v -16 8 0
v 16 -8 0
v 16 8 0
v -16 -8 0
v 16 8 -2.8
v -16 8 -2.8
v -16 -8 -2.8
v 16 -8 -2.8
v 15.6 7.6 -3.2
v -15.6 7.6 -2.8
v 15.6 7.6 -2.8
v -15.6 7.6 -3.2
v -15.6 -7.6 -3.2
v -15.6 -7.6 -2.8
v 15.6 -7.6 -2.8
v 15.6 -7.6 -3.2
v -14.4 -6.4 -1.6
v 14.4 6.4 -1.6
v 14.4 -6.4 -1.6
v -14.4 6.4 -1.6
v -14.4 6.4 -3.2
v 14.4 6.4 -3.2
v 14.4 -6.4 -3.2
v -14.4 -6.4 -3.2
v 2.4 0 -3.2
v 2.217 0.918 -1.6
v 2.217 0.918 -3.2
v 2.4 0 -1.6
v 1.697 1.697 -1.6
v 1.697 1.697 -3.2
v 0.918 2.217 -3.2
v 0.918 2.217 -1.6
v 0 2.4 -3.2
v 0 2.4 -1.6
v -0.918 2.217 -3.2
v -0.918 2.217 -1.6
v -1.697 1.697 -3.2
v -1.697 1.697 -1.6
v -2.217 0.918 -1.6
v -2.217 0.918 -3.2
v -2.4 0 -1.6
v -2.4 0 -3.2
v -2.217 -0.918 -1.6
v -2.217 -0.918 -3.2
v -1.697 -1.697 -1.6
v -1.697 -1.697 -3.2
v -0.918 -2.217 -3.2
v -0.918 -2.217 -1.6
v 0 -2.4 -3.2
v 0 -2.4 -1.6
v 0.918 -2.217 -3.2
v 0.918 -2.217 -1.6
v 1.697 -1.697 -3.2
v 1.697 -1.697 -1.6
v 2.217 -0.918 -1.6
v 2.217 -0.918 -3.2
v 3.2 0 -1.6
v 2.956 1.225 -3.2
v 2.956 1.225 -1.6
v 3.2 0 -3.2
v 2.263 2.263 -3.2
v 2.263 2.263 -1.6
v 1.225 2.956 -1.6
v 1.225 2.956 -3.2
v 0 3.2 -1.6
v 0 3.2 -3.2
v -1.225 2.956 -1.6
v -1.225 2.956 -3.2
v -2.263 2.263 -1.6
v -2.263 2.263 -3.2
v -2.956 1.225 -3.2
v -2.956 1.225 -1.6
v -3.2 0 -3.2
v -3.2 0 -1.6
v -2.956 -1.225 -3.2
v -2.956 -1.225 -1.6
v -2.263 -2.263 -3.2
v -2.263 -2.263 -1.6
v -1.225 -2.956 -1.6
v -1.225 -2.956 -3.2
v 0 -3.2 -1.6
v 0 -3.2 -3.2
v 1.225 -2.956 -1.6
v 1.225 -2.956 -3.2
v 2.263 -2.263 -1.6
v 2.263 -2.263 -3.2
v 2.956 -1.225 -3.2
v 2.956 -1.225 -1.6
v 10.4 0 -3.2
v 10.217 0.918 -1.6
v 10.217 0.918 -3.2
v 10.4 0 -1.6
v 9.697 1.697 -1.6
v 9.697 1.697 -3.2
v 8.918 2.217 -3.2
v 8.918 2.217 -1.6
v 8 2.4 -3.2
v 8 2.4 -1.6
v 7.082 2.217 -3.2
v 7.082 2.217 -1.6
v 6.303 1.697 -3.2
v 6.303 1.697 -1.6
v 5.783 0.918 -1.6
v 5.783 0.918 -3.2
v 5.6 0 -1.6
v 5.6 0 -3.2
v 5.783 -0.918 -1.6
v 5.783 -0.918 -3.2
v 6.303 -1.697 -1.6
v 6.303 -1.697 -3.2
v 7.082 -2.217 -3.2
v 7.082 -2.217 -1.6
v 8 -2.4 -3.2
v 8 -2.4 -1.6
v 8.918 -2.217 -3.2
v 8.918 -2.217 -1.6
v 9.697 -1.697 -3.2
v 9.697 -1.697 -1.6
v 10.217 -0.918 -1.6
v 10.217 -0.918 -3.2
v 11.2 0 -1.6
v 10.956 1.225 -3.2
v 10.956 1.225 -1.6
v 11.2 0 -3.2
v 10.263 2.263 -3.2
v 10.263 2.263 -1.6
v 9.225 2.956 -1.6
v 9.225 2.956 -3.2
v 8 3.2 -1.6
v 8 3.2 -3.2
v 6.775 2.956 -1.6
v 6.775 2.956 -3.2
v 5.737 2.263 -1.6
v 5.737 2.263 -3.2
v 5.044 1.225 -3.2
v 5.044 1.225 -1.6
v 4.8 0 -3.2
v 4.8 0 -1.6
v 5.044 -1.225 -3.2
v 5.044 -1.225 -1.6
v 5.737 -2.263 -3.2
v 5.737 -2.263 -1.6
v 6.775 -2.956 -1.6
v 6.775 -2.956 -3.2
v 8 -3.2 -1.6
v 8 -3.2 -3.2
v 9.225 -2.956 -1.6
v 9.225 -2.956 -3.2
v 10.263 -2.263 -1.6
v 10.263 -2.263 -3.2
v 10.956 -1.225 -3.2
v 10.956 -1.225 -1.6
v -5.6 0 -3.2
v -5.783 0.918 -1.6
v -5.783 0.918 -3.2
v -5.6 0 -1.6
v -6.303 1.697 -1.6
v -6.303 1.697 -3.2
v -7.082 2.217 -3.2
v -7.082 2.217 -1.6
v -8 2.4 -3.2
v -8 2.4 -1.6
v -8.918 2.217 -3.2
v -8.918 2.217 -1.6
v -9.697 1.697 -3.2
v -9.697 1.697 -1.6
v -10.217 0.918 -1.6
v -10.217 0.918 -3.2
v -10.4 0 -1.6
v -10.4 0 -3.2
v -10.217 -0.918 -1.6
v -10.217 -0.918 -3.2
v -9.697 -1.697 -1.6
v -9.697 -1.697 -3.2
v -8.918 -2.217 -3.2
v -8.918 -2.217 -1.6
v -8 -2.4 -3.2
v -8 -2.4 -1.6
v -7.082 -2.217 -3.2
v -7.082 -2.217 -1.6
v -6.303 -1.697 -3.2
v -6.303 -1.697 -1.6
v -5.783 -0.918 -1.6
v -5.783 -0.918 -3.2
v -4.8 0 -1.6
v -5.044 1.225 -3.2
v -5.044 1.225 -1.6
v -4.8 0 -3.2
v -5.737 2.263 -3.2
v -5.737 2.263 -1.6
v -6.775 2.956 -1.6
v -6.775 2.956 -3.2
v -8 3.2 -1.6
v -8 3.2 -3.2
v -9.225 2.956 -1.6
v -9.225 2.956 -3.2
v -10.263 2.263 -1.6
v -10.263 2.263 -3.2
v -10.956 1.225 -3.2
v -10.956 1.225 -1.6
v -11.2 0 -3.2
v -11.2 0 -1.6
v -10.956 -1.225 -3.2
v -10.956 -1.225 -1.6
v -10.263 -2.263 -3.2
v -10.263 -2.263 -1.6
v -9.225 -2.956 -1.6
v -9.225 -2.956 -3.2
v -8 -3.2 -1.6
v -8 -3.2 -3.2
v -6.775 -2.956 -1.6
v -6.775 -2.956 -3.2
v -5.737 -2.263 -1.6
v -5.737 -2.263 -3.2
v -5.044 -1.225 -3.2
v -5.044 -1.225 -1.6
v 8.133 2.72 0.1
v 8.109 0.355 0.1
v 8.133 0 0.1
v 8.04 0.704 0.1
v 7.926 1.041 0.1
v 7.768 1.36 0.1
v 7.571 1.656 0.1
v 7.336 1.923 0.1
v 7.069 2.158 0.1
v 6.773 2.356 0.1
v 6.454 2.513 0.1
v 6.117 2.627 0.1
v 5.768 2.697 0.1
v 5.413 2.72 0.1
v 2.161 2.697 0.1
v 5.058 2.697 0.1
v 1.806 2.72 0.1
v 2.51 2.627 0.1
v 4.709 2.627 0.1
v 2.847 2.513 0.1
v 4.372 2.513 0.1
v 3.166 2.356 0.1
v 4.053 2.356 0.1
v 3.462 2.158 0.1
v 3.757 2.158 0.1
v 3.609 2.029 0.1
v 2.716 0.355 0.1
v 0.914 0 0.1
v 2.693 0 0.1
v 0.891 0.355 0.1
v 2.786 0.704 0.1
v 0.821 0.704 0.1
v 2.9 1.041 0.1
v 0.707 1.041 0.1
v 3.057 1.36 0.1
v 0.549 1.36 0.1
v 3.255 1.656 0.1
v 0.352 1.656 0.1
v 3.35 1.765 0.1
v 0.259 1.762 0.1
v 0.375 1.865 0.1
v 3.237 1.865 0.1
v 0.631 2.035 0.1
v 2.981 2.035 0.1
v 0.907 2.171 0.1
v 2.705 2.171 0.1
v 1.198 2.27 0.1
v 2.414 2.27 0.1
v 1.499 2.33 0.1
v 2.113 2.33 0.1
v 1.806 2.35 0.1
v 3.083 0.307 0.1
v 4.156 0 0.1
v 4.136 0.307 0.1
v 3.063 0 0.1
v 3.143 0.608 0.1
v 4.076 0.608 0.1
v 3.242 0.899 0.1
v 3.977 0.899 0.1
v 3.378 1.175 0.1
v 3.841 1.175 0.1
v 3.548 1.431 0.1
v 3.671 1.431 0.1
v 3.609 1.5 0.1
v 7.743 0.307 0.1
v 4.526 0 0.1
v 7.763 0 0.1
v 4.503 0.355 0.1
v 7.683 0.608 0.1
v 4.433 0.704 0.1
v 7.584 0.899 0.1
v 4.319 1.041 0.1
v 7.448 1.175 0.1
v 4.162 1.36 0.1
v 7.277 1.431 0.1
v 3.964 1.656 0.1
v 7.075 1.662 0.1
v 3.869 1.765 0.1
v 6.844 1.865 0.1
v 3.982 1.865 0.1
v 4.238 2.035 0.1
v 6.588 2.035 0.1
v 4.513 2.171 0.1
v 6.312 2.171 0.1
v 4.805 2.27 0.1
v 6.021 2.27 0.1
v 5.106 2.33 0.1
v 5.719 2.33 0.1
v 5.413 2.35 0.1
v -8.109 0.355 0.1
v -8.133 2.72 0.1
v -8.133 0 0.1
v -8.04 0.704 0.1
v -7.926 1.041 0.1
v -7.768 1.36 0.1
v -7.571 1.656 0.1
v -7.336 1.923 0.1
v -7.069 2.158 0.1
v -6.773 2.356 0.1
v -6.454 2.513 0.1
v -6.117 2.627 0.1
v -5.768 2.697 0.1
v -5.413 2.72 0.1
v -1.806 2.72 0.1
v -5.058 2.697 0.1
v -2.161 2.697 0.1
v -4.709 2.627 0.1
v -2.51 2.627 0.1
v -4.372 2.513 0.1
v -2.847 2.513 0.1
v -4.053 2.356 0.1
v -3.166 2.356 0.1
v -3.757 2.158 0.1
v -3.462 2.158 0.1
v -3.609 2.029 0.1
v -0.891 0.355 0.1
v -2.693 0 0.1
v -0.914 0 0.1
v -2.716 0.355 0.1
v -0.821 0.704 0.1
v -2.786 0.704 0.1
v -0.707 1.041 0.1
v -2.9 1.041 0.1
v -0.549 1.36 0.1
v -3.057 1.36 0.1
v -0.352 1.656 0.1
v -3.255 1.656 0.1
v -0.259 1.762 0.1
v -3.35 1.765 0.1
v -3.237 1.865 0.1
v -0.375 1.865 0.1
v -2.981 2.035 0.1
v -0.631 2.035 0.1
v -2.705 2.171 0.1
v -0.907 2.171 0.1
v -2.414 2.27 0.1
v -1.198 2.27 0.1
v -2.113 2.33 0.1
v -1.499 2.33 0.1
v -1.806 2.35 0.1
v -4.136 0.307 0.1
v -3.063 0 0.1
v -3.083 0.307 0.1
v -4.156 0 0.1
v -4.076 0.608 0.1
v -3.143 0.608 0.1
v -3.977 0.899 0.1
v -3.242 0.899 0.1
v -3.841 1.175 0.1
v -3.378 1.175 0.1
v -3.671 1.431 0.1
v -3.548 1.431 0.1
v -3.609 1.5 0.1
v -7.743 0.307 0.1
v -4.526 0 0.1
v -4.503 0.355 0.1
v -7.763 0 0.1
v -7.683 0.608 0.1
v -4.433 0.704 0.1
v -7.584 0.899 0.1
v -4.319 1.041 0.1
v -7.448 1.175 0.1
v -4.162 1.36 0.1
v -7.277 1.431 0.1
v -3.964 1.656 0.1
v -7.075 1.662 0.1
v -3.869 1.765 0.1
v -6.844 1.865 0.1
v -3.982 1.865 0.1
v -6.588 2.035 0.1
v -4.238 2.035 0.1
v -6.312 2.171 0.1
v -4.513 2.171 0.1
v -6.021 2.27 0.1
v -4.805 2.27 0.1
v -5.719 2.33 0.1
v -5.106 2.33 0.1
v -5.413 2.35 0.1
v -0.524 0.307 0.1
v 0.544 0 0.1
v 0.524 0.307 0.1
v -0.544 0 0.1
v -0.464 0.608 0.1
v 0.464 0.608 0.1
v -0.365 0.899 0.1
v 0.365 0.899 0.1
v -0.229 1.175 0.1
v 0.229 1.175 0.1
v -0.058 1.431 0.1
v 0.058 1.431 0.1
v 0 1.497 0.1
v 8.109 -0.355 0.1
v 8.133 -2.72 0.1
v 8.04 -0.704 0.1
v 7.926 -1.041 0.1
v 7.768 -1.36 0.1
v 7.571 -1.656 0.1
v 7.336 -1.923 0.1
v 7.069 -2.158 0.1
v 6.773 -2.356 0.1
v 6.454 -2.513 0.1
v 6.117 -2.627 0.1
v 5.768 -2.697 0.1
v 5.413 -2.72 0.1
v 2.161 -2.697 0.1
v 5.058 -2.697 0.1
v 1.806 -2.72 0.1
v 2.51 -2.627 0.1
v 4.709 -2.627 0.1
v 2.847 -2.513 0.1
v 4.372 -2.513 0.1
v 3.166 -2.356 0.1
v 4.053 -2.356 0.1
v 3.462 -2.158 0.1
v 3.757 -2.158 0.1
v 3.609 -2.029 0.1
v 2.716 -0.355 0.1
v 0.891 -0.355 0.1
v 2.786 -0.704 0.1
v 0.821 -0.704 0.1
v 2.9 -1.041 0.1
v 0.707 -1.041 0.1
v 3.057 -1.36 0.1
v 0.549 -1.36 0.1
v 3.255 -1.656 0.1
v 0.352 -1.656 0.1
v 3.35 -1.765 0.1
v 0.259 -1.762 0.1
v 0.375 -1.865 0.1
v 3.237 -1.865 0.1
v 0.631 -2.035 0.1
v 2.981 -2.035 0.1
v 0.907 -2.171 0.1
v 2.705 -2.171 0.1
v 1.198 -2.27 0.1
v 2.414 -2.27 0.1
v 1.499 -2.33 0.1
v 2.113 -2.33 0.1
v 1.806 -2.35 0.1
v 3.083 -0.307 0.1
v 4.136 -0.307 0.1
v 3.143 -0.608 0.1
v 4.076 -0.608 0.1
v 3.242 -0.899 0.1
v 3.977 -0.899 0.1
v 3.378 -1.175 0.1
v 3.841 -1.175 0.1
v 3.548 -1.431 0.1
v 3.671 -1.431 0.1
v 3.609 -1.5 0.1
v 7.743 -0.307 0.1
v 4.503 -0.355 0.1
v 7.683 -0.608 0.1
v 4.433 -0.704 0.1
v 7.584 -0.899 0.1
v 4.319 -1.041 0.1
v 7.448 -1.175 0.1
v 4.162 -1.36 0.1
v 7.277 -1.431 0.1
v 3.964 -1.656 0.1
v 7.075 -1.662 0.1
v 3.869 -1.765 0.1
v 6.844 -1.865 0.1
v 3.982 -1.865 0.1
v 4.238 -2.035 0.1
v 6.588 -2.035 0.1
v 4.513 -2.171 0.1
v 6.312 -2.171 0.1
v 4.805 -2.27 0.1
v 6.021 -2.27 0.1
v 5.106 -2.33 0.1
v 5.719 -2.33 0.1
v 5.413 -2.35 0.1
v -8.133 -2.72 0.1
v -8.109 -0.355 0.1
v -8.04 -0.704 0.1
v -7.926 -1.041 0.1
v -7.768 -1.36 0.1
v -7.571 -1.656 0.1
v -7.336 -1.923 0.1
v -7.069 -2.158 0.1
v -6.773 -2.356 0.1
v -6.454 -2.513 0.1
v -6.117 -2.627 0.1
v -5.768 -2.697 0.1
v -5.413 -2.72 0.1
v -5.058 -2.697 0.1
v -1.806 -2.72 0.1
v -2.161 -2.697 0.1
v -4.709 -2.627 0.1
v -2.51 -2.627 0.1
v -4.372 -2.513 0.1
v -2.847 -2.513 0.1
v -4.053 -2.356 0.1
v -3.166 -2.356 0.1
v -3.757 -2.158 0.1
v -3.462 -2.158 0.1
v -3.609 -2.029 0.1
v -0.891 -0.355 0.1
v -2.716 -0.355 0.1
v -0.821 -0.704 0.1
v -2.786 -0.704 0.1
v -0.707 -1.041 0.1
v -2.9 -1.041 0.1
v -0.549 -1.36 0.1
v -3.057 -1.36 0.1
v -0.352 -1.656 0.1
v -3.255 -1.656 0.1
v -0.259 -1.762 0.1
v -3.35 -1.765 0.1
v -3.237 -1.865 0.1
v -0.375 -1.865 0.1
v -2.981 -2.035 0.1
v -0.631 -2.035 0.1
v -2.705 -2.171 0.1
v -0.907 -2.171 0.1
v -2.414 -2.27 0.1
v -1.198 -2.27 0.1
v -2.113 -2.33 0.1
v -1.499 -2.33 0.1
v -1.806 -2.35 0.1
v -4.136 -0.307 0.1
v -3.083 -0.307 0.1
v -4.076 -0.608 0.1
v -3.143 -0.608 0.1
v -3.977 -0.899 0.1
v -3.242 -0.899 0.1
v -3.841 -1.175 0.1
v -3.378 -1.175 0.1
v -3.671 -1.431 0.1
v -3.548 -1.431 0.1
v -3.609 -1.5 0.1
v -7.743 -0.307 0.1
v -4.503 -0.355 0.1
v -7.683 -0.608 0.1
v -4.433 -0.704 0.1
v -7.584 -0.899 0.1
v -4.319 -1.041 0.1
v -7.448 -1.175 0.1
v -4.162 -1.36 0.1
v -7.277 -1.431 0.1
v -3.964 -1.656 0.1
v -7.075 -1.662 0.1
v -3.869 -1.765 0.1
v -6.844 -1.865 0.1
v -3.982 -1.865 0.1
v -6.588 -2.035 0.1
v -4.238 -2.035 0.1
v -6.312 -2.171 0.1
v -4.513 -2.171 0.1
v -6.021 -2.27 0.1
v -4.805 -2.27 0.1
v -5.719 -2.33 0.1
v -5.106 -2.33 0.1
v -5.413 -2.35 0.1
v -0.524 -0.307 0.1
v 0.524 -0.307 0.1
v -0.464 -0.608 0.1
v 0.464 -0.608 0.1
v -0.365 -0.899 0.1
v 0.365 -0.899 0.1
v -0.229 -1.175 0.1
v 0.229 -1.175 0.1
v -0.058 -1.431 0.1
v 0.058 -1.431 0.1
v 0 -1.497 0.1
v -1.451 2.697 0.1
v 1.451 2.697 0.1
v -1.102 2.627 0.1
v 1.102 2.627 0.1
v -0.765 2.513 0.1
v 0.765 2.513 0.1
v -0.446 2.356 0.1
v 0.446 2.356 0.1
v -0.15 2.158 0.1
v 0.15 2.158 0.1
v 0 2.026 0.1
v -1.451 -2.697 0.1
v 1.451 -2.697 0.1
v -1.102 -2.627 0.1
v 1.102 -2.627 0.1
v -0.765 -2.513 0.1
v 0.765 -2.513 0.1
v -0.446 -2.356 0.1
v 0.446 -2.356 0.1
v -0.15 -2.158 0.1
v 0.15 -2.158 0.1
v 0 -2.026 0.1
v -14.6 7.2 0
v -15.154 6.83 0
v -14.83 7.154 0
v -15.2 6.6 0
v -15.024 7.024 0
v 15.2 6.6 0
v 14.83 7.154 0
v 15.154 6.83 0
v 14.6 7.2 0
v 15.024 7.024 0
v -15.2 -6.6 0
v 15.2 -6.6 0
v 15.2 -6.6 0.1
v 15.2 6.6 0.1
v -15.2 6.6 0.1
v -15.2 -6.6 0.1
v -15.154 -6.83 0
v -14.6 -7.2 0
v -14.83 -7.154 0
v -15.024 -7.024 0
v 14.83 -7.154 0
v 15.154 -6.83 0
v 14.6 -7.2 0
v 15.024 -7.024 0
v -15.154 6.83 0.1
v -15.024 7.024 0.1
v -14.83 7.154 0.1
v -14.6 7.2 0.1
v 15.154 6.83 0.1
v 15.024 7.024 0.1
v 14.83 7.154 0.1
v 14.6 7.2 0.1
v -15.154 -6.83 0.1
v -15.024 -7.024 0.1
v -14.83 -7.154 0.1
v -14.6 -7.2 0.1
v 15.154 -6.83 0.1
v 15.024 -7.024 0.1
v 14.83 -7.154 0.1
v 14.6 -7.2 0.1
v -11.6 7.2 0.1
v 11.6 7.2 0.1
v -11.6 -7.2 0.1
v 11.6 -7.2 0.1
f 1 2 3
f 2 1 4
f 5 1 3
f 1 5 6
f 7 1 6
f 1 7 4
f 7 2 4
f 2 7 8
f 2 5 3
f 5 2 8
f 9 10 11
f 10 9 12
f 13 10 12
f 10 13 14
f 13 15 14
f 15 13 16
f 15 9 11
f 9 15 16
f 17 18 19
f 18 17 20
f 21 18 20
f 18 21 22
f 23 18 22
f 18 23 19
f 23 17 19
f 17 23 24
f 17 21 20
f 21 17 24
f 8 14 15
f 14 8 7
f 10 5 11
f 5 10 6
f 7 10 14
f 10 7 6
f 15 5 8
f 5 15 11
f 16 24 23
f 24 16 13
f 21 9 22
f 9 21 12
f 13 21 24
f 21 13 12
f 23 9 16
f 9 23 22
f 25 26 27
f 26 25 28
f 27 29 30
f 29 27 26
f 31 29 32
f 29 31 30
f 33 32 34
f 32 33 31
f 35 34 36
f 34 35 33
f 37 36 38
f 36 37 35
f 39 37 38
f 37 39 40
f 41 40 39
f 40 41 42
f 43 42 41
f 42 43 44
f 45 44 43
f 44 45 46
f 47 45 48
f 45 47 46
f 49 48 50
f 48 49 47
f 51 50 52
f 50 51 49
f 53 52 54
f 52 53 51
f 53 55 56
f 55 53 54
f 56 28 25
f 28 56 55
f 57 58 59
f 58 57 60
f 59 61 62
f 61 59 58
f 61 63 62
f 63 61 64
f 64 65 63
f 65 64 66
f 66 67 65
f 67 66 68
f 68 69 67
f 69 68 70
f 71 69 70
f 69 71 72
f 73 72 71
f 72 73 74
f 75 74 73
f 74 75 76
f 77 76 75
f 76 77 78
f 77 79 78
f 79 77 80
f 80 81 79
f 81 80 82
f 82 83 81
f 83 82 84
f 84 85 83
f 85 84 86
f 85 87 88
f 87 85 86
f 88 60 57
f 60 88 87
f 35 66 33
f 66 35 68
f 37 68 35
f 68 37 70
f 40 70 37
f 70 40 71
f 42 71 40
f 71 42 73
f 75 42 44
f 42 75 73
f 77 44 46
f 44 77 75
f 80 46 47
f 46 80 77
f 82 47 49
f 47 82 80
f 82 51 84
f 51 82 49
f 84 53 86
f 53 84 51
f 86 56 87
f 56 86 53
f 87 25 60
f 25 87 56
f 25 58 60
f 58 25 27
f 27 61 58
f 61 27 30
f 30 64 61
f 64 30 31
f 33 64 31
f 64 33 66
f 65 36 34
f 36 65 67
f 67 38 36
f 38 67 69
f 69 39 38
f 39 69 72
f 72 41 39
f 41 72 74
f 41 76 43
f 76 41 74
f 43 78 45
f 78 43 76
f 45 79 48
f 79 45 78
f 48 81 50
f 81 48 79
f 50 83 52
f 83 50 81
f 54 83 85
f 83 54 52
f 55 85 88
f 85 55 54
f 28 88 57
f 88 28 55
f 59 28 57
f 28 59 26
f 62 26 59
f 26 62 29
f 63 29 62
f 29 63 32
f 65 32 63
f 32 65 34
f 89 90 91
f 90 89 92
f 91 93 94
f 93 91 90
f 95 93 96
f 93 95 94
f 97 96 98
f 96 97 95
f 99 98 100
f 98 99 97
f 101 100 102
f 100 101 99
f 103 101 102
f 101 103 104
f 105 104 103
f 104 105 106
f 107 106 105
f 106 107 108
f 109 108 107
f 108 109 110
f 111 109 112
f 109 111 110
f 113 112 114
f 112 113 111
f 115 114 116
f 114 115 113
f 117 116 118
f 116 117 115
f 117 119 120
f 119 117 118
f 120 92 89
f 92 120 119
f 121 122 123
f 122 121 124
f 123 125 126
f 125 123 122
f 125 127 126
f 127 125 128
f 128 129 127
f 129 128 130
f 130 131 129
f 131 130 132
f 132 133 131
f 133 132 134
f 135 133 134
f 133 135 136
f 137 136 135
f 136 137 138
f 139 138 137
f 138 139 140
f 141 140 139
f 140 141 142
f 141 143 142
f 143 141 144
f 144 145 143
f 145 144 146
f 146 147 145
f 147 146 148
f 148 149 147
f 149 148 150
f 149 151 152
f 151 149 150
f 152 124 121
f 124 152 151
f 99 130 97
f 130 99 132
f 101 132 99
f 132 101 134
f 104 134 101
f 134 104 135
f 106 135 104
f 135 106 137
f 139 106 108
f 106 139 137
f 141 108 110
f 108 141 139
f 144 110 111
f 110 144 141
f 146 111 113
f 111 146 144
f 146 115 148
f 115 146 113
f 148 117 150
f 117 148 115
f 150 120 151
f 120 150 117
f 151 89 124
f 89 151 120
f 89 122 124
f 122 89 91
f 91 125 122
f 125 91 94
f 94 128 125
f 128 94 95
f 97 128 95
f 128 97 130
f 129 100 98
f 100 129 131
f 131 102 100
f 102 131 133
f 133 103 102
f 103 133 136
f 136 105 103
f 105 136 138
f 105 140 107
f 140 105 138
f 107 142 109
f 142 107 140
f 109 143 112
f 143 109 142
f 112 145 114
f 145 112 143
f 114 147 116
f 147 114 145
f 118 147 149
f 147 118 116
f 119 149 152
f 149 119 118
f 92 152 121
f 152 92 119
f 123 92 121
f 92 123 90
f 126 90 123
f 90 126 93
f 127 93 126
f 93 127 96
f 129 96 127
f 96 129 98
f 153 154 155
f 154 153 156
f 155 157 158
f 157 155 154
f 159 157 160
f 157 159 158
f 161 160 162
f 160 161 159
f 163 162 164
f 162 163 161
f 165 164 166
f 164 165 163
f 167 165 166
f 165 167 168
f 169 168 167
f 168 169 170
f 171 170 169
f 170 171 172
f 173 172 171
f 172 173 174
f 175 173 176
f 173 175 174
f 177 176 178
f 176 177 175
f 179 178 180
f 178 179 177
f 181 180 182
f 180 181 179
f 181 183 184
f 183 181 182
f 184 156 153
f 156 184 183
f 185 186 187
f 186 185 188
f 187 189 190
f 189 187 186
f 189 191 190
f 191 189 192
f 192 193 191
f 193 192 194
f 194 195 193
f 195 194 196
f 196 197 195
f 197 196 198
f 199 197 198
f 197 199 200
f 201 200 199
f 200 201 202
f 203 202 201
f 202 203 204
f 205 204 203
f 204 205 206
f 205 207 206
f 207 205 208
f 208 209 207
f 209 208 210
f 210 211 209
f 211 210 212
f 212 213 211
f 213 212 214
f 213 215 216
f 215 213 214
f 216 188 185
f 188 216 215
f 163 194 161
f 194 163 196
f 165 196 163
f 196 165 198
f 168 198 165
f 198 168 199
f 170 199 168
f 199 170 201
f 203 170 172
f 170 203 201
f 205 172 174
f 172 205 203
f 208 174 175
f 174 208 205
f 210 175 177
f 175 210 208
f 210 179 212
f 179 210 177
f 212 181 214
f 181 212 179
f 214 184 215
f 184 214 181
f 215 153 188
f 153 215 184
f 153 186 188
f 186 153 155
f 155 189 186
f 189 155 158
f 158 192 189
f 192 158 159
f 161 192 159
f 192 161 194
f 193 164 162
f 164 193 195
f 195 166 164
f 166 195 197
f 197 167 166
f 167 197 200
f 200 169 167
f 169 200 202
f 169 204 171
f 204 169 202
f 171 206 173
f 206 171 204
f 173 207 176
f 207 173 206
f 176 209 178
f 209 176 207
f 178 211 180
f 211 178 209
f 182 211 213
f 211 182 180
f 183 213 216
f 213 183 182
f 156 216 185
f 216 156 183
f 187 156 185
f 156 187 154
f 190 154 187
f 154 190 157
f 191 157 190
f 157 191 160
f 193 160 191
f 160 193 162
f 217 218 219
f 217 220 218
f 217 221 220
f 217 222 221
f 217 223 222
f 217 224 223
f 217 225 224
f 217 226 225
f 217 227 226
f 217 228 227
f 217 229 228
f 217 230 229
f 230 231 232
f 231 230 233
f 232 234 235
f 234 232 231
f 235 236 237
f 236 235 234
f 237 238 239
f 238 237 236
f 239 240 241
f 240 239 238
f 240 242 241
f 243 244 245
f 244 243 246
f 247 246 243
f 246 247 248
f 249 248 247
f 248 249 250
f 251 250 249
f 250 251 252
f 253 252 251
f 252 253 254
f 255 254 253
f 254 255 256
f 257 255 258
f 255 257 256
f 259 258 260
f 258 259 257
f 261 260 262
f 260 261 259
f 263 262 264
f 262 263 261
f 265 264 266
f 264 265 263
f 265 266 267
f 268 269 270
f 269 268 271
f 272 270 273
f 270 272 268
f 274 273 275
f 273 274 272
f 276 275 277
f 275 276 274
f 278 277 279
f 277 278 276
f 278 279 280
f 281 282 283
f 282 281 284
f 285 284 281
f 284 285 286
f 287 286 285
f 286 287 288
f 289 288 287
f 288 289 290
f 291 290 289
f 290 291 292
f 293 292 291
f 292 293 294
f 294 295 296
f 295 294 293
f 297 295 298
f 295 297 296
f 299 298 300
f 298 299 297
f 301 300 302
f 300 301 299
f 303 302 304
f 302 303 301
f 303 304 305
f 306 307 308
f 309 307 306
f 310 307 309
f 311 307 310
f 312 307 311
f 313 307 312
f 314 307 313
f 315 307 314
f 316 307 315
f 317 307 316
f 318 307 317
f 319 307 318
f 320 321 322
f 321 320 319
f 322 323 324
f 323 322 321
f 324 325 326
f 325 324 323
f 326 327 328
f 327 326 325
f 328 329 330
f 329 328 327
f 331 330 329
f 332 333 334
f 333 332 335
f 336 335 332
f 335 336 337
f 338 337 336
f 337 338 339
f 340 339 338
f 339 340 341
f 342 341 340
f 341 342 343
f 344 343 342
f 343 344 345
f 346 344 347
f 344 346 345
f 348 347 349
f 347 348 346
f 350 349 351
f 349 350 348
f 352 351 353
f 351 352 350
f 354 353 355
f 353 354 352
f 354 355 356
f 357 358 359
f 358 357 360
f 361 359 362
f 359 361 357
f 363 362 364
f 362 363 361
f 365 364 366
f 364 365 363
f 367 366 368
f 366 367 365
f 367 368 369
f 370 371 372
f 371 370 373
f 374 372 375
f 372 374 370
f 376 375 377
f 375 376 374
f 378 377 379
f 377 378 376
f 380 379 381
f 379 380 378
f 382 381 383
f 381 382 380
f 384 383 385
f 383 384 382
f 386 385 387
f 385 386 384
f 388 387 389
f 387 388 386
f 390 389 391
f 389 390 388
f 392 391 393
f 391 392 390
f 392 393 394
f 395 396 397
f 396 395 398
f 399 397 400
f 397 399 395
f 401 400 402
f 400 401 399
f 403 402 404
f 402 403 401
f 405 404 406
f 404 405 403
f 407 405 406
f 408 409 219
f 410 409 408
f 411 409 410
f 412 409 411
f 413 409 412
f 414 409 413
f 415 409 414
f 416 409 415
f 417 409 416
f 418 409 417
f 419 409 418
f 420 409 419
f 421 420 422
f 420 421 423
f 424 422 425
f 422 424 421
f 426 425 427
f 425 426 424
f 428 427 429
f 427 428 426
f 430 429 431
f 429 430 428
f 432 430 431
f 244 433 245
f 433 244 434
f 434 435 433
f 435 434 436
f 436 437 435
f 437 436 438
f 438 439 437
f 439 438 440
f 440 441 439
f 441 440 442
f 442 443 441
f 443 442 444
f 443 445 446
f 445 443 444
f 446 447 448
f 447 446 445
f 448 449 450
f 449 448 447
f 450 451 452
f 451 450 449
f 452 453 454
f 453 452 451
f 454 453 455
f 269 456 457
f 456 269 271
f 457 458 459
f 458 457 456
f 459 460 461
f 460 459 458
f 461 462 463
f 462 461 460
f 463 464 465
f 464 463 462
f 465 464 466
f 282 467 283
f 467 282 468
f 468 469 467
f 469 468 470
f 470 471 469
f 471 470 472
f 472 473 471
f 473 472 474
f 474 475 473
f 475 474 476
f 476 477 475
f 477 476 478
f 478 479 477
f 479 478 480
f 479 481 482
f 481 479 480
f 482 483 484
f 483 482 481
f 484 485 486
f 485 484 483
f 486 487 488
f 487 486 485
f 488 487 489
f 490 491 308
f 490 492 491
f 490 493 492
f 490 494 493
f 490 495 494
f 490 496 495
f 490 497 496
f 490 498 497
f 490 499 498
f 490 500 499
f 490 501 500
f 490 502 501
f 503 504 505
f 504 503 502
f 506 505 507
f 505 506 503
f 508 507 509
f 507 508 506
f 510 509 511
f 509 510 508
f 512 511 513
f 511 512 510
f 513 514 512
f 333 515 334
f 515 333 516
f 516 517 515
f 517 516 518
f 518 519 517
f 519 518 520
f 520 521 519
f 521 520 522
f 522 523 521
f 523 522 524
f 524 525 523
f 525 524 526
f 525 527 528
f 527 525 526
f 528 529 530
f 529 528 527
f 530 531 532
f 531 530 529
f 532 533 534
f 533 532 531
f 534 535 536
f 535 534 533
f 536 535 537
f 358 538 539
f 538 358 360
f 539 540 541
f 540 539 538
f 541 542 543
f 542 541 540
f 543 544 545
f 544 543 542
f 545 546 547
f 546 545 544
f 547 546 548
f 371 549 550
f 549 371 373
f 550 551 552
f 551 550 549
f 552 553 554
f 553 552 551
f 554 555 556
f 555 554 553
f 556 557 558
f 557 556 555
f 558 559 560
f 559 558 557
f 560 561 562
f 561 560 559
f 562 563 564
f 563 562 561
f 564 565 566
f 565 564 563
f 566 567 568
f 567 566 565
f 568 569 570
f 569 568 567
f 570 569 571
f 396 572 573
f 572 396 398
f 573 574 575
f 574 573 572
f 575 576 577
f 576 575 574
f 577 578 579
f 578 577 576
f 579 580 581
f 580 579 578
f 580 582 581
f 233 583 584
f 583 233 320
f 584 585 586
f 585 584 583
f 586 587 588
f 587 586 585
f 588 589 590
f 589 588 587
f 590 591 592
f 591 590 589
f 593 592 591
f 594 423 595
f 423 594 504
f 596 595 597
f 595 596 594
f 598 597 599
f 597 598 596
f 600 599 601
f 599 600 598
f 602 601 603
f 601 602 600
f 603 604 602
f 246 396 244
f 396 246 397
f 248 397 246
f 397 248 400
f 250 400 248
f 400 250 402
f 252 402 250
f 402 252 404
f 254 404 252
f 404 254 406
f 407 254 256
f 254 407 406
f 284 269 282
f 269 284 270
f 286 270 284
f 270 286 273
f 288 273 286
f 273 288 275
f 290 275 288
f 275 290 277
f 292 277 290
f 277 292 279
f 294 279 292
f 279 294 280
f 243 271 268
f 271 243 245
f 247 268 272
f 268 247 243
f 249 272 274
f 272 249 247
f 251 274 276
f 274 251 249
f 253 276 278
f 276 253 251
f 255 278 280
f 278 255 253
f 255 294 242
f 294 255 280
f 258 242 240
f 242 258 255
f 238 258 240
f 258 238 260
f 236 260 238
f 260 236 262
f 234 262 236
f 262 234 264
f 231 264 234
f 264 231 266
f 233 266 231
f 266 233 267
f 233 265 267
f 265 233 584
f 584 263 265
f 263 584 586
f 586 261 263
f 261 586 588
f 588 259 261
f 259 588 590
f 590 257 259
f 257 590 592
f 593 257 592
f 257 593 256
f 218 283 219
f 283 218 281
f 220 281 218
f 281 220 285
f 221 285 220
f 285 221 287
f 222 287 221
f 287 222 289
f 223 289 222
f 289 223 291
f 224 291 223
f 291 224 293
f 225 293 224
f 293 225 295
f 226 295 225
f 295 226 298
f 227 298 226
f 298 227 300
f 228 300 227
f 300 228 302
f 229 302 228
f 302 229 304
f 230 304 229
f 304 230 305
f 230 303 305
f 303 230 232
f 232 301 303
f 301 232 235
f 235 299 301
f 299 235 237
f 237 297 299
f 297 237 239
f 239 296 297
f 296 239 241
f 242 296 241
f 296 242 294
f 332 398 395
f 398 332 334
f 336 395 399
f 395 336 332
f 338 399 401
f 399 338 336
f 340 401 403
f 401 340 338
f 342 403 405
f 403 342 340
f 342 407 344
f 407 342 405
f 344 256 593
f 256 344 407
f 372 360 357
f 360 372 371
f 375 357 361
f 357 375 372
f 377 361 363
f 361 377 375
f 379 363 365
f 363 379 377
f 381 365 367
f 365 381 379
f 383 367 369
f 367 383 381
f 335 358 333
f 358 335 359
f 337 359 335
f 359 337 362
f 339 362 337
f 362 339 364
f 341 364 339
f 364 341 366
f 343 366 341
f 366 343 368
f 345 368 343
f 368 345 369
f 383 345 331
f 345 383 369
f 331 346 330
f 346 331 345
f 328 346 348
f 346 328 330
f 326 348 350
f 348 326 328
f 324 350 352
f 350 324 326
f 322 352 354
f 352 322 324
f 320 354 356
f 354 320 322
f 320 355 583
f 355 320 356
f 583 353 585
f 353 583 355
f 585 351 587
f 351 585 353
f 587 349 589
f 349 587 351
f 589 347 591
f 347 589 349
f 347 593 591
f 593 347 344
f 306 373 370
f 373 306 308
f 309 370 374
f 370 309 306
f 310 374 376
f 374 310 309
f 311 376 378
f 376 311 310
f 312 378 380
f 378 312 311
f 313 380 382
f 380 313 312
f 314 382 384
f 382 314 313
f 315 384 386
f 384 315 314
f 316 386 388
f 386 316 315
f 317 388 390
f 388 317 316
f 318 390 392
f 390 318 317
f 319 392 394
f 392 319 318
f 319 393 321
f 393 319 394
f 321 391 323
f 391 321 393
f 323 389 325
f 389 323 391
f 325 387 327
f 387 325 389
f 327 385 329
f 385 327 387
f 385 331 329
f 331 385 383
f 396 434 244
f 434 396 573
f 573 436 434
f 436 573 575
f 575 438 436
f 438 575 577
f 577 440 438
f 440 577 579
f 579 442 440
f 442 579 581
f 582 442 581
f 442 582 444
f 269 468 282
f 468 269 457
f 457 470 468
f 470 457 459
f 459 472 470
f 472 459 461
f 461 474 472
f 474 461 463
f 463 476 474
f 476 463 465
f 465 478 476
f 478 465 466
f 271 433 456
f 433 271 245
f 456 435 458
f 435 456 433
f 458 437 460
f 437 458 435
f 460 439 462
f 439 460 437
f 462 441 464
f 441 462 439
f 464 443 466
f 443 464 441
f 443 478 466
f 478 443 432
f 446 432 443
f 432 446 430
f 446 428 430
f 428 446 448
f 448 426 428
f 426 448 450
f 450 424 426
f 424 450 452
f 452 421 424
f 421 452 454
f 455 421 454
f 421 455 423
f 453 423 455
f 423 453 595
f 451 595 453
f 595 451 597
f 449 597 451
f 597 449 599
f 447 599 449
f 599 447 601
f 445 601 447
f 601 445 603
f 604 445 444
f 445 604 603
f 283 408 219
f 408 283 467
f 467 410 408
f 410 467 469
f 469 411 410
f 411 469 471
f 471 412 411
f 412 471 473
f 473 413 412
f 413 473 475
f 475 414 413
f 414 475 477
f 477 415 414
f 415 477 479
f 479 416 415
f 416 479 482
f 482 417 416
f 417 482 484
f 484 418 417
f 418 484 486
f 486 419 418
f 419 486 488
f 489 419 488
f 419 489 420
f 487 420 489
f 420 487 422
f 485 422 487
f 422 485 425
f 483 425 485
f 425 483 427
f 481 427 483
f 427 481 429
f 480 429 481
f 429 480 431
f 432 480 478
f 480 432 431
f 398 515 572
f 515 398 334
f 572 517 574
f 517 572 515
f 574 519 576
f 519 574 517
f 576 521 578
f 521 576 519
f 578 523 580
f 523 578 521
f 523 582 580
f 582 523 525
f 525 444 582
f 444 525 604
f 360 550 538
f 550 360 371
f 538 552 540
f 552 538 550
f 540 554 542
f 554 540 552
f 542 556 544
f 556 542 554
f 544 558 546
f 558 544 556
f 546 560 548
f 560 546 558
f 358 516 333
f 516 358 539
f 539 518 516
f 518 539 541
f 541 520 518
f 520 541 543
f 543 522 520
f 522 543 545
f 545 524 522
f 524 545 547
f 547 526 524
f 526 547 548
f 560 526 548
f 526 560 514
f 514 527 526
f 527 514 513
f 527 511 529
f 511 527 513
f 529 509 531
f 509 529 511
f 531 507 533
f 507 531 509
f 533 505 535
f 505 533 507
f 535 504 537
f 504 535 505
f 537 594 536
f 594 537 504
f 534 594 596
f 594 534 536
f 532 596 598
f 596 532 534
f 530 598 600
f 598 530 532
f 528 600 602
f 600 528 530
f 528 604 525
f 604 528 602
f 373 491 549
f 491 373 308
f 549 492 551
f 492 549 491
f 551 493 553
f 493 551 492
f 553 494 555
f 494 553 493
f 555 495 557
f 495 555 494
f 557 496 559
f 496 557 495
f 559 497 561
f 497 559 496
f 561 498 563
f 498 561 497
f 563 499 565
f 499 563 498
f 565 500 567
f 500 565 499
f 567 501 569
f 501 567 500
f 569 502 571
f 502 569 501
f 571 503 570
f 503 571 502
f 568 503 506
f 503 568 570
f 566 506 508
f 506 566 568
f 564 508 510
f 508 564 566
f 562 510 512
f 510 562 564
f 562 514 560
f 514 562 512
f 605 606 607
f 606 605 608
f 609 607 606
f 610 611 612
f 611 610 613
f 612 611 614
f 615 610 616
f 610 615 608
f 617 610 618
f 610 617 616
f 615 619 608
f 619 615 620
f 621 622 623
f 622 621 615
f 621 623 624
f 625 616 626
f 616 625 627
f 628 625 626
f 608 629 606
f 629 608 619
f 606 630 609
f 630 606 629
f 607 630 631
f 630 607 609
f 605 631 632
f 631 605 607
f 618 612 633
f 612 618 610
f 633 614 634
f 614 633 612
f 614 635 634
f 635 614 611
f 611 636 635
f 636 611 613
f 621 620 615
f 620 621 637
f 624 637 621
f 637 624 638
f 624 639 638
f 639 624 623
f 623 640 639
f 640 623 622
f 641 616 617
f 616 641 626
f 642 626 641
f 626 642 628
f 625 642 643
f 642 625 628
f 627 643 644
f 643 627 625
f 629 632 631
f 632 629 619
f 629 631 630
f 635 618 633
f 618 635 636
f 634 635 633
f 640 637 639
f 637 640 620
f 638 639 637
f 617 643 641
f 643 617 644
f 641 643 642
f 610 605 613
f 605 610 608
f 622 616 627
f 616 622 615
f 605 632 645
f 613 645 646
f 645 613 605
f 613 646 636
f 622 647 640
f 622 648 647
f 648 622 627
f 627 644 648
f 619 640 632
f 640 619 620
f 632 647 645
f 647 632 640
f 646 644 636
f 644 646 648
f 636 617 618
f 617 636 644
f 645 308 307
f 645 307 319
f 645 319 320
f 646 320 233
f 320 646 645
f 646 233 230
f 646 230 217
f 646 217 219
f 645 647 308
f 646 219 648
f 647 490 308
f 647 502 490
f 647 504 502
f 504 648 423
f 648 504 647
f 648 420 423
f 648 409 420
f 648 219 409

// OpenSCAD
use <../lib.scad>
use <6142271j.scad>
use <87079.scad>
function ldraw_lib__87079d0o() = [
// 0 Tile  2 x  4 with White Audi Logo on Red Stripe on White Background Sticker
// 0 Name: 87079d0o.dat
// 0 Author: Vincent Messenet [Cheenzo]
// 0 !LDRAW_ORG Shortcut UPDATE 2025-03
// 0 !LICENSE Licensed under CC BY 4.0 : see CAreadme.txt
// 
// 0 BFC CERTIFY CCW
  [0,"BFC","CERTIFY"],
  [0,"BFC","CCW"],
// 
// 0 !CATEGORY Sticker Shortcut
// 0 !KEYWORDS Audi R8 LMS ultra, Bricklink 87079pb0489, Set 75873
// 
// 0 !HISTORY 2025-03-30 [OrionP] Official Update 2025-03
// 
// 1 16 0 0 0 1 0 0 0 1 0 0 0 1 87079.dat
  [1,16,0,0,0,1,0,0,0,1,0,0,0,1, ldraw_lib__87079()],
// 1 16 0 0 0 1 0 0 0 1 0 0 0 1 6142271j.dat
  [1,16,0,0,0,1,0,0,0,1,0,0,0,1, ldraw_lib__6142271j()],
];
module ldraw_lib__87079d0o(step=0, col=false, unit=2/5, alt=false, line=0.2, solid=!$preview)
    makepoly(ldraw_lib__87079d0o(), step=step, col=col, unit=unit, alt=alt, line=line, solid=solid);
ldraw_lib__87079d0o(line=0.2);
